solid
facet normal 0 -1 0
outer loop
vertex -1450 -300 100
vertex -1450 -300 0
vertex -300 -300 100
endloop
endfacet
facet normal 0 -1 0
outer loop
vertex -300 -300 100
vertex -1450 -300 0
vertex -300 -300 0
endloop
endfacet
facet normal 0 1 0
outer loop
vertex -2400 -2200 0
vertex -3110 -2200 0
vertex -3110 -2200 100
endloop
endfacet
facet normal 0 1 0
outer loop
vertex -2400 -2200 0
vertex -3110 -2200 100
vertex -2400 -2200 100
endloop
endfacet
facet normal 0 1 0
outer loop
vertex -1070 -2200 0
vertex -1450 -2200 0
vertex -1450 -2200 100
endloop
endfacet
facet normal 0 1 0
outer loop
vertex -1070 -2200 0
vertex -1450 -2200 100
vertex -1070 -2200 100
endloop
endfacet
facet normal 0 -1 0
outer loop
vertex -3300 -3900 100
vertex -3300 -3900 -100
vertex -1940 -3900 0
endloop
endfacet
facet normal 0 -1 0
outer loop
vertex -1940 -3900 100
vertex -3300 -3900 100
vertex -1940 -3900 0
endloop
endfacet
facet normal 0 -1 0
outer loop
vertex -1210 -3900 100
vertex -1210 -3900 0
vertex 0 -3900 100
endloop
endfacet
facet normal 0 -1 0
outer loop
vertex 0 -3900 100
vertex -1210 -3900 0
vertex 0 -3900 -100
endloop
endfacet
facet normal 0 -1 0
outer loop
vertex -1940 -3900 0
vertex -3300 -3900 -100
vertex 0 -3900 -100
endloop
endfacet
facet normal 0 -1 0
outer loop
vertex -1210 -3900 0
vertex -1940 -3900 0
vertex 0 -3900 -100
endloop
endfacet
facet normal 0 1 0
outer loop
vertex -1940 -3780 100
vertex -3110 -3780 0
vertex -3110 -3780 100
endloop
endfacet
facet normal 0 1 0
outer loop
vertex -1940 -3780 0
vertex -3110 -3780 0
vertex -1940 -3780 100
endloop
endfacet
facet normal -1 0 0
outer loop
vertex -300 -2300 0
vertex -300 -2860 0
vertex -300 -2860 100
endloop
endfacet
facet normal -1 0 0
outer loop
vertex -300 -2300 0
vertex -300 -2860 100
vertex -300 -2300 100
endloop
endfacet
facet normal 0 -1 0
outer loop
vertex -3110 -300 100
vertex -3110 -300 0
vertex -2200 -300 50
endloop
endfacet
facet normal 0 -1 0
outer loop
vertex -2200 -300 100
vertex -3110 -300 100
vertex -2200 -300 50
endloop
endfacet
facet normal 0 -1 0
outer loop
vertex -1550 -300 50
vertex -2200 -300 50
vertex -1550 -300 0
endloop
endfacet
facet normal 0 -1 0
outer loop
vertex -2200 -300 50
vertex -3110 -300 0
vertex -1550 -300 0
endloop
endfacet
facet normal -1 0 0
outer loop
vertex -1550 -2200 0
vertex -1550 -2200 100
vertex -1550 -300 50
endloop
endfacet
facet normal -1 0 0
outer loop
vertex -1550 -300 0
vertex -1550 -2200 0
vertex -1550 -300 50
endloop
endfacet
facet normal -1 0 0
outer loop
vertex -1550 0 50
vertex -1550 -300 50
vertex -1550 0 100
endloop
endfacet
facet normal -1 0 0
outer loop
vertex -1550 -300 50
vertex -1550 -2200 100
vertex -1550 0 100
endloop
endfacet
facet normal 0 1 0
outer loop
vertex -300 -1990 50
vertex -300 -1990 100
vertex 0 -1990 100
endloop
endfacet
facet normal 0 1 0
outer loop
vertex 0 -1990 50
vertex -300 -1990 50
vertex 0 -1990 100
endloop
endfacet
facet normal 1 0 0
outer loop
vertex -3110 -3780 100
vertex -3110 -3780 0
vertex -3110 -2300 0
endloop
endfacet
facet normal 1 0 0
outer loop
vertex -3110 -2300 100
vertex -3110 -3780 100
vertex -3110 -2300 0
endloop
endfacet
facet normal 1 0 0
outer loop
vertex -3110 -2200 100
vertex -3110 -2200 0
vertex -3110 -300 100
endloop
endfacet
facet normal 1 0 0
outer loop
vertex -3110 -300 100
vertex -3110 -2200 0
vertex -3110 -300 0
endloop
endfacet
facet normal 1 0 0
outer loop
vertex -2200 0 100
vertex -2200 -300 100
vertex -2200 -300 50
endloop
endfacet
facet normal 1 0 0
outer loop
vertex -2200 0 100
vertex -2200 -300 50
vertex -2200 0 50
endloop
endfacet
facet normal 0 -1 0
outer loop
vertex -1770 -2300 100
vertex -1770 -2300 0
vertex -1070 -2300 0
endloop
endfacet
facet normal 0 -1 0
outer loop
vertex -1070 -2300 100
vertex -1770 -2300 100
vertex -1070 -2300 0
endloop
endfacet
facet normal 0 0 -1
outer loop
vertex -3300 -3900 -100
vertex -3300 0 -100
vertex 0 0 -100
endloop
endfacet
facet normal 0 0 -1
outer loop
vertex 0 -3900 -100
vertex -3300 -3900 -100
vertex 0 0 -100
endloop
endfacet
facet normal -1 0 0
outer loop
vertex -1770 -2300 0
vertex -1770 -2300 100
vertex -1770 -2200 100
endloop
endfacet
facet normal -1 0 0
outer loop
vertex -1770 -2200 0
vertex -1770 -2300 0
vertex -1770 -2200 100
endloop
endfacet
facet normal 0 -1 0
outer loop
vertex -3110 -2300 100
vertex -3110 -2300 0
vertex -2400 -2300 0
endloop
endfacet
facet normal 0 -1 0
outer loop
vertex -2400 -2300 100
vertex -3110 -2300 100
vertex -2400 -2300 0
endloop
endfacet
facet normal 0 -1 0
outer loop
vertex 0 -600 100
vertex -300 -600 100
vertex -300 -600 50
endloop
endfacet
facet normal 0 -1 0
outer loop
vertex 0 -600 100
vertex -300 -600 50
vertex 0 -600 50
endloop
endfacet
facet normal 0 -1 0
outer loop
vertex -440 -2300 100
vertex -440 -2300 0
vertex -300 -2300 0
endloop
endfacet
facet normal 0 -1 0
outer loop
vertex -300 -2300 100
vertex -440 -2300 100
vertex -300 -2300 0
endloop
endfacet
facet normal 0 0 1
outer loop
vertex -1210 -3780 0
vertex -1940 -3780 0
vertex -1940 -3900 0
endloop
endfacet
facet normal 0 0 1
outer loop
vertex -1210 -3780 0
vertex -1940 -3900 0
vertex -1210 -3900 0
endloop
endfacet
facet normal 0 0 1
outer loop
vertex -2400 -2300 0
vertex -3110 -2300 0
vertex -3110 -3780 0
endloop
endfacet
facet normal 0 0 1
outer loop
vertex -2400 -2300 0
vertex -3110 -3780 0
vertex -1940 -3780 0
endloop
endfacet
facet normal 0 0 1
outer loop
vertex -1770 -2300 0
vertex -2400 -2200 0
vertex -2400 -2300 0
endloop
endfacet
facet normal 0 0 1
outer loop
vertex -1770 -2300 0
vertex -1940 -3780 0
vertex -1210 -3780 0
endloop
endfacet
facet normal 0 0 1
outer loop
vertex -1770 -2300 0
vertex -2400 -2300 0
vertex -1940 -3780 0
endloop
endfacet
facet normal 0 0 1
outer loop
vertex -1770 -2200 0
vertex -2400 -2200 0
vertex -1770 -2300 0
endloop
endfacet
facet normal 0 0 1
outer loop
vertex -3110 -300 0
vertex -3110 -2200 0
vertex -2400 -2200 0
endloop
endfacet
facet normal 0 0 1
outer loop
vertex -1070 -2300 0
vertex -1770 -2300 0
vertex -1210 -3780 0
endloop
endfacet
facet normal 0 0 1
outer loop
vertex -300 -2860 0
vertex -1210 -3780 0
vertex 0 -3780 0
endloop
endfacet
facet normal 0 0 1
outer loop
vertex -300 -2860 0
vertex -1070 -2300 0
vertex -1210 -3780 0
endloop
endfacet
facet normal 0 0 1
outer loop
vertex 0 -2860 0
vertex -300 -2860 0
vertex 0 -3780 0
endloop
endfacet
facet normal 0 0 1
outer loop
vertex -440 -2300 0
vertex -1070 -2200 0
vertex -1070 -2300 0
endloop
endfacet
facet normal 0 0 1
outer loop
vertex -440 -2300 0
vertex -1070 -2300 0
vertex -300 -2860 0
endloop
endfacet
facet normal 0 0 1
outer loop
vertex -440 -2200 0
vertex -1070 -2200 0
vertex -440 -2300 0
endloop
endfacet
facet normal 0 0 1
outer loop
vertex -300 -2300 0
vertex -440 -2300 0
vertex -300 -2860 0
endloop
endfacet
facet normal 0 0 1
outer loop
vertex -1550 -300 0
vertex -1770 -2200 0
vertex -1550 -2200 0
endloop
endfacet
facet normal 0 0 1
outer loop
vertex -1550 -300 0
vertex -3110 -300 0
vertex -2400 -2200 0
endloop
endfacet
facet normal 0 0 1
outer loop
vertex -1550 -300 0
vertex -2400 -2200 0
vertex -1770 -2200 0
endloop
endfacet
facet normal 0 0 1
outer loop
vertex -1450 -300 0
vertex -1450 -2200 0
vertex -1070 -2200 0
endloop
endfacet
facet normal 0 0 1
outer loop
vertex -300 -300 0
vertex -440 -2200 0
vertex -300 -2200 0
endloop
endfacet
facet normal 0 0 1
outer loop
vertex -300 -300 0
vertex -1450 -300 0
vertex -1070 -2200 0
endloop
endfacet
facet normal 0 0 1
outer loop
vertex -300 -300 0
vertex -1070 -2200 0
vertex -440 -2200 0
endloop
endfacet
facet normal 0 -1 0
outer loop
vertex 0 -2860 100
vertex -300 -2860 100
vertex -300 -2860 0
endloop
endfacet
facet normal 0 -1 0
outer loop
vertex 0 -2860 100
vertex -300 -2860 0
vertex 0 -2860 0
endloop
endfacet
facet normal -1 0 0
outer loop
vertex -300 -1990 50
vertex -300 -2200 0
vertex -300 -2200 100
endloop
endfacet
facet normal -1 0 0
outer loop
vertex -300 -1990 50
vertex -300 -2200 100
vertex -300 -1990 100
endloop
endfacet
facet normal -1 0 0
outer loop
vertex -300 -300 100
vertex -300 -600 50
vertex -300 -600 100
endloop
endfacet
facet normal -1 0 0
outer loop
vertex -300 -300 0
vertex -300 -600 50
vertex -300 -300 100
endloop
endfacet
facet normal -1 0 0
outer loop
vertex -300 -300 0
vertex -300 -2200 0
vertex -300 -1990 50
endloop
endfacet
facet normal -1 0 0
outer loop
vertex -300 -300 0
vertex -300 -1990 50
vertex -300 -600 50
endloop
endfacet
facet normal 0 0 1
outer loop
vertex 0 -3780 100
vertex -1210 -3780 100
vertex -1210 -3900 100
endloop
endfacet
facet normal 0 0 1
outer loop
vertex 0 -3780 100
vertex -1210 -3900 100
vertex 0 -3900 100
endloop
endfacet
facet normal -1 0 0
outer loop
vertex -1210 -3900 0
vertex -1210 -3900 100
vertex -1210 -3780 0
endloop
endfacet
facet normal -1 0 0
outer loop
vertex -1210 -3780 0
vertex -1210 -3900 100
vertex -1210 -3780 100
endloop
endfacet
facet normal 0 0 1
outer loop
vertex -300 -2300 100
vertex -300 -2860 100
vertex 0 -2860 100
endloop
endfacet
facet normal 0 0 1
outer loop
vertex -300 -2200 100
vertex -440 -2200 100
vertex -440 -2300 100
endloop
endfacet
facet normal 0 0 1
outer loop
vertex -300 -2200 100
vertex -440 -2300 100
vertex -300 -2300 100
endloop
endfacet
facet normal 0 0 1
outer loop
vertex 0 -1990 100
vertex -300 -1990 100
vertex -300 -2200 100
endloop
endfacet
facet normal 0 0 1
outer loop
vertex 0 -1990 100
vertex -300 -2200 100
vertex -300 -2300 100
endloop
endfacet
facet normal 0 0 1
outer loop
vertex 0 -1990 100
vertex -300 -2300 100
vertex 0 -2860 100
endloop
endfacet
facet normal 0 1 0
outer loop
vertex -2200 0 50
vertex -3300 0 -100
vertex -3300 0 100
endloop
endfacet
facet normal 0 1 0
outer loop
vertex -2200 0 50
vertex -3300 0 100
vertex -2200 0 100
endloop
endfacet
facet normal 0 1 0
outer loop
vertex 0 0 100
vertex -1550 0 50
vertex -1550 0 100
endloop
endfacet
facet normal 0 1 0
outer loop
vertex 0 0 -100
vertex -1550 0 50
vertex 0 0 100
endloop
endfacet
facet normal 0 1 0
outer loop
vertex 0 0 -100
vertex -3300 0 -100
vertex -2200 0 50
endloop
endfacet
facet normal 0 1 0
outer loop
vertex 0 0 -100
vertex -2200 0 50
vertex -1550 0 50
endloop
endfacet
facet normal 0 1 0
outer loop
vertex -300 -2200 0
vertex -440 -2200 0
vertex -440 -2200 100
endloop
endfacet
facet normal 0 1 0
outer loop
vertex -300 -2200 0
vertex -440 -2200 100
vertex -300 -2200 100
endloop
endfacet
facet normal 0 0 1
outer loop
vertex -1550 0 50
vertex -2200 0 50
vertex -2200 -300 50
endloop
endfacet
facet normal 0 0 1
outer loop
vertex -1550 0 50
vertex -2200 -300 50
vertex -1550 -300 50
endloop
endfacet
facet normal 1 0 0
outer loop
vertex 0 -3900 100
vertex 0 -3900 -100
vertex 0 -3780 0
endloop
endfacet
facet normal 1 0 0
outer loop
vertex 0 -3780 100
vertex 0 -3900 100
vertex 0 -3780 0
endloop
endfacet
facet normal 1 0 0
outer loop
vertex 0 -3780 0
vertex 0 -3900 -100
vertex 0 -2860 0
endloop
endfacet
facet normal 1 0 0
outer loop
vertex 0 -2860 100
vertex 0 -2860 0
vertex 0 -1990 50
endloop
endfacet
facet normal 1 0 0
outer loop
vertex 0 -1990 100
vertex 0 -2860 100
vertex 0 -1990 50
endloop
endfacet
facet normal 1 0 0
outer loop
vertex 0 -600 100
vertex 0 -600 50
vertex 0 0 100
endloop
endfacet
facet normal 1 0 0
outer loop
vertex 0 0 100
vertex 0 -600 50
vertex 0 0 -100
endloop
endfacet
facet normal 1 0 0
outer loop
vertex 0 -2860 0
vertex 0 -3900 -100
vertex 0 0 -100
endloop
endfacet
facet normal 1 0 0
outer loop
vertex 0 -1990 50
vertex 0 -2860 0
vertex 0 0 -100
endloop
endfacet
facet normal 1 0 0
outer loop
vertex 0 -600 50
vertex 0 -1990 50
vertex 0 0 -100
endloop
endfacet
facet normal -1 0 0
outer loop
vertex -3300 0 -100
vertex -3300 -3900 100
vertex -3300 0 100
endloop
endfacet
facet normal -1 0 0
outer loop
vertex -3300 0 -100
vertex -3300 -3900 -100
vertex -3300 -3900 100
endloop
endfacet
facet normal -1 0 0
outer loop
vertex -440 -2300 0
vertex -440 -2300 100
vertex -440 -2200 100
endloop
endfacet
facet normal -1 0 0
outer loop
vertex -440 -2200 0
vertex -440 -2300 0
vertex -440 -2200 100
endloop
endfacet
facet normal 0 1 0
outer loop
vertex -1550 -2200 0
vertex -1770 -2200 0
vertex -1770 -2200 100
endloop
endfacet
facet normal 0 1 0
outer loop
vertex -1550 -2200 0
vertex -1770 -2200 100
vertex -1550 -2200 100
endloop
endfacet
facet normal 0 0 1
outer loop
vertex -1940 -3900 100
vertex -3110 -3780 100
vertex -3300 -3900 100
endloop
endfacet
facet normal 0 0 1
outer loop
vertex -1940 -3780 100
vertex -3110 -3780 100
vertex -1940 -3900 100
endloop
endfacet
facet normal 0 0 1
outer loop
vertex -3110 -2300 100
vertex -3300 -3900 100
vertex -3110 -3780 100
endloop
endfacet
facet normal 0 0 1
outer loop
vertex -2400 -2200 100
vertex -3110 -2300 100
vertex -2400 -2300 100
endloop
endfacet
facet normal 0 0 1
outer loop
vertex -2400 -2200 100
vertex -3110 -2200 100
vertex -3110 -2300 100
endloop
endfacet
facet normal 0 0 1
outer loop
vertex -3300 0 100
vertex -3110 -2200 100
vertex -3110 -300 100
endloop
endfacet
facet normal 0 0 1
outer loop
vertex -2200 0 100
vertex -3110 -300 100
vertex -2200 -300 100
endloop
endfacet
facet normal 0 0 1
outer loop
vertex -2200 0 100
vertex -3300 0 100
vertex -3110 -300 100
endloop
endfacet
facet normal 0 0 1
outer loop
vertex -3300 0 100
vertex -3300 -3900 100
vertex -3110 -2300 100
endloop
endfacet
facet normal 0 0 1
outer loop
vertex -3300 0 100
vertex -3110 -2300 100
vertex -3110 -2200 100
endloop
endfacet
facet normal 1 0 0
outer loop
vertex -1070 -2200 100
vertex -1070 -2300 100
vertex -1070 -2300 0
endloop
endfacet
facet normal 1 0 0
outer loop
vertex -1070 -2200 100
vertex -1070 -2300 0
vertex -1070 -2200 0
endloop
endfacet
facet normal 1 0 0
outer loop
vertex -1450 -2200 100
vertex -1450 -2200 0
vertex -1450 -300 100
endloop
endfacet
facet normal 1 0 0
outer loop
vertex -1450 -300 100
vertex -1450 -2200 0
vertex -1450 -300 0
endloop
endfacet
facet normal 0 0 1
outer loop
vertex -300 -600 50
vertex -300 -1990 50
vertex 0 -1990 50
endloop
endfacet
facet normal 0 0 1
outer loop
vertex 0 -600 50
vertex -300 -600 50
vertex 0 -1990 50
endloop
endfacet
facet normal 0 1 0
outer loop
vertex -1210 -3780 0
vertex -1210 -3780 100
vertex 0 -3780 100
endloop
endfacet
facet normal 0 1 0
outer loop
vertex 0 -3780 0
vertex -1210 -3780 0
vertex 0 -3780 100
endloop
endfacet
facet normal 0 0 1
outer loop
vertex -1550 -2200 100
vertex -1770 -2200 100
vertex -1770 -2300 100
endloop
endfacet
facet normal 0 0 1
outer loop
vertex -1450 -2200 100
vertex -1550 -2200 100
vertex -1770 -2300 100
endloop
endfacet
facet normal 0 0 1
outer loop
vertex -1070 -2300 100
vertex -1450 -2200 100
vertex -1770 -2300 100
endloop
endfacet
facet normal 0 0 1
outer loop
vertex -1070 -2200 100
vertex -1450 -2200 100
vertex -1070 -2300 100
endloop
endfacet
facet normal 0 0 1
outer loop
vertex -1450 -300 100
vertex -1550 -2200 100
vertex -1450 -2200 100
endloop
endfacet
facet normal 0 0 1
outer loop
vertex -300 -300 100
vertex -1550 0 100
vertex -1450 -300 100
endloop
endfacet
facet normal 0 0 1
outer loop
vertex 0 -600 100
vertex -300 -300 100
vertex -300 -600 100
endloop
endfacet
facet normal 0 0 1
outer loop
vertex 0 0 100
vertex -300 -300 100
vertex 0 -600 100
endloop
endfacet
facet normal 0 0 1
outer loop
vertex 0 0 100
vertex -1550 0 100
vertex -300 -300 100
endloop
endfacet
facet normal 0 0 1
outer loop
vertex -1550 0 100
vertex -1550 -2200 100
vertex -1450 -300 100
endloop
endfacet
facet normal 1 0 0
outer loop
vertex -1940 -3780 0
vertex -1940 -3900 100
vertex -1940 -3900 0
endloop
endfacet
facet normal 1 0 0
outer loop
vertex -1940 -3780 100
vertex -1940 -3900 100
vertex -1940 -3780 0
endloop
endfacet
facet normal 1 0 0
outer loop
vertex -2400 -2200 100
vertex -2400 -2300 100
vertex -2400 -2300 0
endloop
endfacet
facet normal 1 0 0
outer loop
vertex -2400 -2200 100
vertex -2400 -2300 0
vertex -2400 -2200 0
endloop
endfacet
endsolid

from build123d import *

# Parameters (mm, degrees)
F0_W     = 3300
F0_H     = 3900
F1_DEPTH = 100
F2_W     = 3300
F2_H     = 3900
F2_W_2   = 2810
F2_H_2   = 1480
F2_W_3   = 1560
F2_H_3   = 1900
F2_W_4   = 1150
F3_DEPTH = 100
F4_W     = 630
F4_H     = 100
F4_W_2   = 300
F4_H_2   = 920
F4_W_3   = 730
F4_H_3   = 120
F5_DEPTH = 100
F4_W_4   = 650
F4_H_4   = 300
F4_H_5   = 1390
F6_DEPTH = 50


with BuildPart() as f1:
    # F0 (on Top) → F1 (new body)
    with BuildSketch(Plane.XY):
        with Locations((-1650, -1950)):
            Rectangle(F0_W, F0_H)
    extrude(amount=-F1_DEPTH)

    # F2 (on face) → F3 (join)
    with BuildSketch(Plane.XY):
        with Locations((-1650, -1950)):
            Rectangle(F2_W, F2_H)
        with Locations((-1705, -3040)):
            Rectangle(F2_W_2, F2_H_2, mode=Mode.SUBTRACT)
        with Locations((-2330, -1250)):
            Rectangle(F2_W_3, F2_H_3, mode=Mode.SUBTRACT)
        with Locations((-875, -1250)):
            Rectangle(F2_W_4, F2_H_3, mode=Mode.SUBTRACT)
    extrude(amount=F3_DEPTH)

    # F4 (on face) → F5 (cut, through all)
    with BuildSketch(Plane.XY.offset(100)):
        with Locations((-2085, -2250)):
            Rectangle(F4_W, F4_H)
        with Locations((-755, -2250)):
            Rectangle(F4_W, F4_H)
        with Locations((-150, -3320)):
            Rectangle(F4_W_2, F4_H_2)
        with Locations((-1575, -3840)):
            Rectangle(F4_W_3, F4_H_3)
    extrude(amount=-F5_DEPTH, mode=Mode.SUBTRACT)

    # F4 (on face) → F6 (cut)
    with BuildSketch(Plane.XY.offset(100)):
        with Locations((-1875, -150)):
            Rectangle(F4_W_4, F4_H_4)
        with Locations((-150, -1295)):
            Rectangle(F4_W_2, F4_H_5)
    extrude(amount=-F6_DEPTH, mode=Mode.SUBTRACT)


solid = f1.part
